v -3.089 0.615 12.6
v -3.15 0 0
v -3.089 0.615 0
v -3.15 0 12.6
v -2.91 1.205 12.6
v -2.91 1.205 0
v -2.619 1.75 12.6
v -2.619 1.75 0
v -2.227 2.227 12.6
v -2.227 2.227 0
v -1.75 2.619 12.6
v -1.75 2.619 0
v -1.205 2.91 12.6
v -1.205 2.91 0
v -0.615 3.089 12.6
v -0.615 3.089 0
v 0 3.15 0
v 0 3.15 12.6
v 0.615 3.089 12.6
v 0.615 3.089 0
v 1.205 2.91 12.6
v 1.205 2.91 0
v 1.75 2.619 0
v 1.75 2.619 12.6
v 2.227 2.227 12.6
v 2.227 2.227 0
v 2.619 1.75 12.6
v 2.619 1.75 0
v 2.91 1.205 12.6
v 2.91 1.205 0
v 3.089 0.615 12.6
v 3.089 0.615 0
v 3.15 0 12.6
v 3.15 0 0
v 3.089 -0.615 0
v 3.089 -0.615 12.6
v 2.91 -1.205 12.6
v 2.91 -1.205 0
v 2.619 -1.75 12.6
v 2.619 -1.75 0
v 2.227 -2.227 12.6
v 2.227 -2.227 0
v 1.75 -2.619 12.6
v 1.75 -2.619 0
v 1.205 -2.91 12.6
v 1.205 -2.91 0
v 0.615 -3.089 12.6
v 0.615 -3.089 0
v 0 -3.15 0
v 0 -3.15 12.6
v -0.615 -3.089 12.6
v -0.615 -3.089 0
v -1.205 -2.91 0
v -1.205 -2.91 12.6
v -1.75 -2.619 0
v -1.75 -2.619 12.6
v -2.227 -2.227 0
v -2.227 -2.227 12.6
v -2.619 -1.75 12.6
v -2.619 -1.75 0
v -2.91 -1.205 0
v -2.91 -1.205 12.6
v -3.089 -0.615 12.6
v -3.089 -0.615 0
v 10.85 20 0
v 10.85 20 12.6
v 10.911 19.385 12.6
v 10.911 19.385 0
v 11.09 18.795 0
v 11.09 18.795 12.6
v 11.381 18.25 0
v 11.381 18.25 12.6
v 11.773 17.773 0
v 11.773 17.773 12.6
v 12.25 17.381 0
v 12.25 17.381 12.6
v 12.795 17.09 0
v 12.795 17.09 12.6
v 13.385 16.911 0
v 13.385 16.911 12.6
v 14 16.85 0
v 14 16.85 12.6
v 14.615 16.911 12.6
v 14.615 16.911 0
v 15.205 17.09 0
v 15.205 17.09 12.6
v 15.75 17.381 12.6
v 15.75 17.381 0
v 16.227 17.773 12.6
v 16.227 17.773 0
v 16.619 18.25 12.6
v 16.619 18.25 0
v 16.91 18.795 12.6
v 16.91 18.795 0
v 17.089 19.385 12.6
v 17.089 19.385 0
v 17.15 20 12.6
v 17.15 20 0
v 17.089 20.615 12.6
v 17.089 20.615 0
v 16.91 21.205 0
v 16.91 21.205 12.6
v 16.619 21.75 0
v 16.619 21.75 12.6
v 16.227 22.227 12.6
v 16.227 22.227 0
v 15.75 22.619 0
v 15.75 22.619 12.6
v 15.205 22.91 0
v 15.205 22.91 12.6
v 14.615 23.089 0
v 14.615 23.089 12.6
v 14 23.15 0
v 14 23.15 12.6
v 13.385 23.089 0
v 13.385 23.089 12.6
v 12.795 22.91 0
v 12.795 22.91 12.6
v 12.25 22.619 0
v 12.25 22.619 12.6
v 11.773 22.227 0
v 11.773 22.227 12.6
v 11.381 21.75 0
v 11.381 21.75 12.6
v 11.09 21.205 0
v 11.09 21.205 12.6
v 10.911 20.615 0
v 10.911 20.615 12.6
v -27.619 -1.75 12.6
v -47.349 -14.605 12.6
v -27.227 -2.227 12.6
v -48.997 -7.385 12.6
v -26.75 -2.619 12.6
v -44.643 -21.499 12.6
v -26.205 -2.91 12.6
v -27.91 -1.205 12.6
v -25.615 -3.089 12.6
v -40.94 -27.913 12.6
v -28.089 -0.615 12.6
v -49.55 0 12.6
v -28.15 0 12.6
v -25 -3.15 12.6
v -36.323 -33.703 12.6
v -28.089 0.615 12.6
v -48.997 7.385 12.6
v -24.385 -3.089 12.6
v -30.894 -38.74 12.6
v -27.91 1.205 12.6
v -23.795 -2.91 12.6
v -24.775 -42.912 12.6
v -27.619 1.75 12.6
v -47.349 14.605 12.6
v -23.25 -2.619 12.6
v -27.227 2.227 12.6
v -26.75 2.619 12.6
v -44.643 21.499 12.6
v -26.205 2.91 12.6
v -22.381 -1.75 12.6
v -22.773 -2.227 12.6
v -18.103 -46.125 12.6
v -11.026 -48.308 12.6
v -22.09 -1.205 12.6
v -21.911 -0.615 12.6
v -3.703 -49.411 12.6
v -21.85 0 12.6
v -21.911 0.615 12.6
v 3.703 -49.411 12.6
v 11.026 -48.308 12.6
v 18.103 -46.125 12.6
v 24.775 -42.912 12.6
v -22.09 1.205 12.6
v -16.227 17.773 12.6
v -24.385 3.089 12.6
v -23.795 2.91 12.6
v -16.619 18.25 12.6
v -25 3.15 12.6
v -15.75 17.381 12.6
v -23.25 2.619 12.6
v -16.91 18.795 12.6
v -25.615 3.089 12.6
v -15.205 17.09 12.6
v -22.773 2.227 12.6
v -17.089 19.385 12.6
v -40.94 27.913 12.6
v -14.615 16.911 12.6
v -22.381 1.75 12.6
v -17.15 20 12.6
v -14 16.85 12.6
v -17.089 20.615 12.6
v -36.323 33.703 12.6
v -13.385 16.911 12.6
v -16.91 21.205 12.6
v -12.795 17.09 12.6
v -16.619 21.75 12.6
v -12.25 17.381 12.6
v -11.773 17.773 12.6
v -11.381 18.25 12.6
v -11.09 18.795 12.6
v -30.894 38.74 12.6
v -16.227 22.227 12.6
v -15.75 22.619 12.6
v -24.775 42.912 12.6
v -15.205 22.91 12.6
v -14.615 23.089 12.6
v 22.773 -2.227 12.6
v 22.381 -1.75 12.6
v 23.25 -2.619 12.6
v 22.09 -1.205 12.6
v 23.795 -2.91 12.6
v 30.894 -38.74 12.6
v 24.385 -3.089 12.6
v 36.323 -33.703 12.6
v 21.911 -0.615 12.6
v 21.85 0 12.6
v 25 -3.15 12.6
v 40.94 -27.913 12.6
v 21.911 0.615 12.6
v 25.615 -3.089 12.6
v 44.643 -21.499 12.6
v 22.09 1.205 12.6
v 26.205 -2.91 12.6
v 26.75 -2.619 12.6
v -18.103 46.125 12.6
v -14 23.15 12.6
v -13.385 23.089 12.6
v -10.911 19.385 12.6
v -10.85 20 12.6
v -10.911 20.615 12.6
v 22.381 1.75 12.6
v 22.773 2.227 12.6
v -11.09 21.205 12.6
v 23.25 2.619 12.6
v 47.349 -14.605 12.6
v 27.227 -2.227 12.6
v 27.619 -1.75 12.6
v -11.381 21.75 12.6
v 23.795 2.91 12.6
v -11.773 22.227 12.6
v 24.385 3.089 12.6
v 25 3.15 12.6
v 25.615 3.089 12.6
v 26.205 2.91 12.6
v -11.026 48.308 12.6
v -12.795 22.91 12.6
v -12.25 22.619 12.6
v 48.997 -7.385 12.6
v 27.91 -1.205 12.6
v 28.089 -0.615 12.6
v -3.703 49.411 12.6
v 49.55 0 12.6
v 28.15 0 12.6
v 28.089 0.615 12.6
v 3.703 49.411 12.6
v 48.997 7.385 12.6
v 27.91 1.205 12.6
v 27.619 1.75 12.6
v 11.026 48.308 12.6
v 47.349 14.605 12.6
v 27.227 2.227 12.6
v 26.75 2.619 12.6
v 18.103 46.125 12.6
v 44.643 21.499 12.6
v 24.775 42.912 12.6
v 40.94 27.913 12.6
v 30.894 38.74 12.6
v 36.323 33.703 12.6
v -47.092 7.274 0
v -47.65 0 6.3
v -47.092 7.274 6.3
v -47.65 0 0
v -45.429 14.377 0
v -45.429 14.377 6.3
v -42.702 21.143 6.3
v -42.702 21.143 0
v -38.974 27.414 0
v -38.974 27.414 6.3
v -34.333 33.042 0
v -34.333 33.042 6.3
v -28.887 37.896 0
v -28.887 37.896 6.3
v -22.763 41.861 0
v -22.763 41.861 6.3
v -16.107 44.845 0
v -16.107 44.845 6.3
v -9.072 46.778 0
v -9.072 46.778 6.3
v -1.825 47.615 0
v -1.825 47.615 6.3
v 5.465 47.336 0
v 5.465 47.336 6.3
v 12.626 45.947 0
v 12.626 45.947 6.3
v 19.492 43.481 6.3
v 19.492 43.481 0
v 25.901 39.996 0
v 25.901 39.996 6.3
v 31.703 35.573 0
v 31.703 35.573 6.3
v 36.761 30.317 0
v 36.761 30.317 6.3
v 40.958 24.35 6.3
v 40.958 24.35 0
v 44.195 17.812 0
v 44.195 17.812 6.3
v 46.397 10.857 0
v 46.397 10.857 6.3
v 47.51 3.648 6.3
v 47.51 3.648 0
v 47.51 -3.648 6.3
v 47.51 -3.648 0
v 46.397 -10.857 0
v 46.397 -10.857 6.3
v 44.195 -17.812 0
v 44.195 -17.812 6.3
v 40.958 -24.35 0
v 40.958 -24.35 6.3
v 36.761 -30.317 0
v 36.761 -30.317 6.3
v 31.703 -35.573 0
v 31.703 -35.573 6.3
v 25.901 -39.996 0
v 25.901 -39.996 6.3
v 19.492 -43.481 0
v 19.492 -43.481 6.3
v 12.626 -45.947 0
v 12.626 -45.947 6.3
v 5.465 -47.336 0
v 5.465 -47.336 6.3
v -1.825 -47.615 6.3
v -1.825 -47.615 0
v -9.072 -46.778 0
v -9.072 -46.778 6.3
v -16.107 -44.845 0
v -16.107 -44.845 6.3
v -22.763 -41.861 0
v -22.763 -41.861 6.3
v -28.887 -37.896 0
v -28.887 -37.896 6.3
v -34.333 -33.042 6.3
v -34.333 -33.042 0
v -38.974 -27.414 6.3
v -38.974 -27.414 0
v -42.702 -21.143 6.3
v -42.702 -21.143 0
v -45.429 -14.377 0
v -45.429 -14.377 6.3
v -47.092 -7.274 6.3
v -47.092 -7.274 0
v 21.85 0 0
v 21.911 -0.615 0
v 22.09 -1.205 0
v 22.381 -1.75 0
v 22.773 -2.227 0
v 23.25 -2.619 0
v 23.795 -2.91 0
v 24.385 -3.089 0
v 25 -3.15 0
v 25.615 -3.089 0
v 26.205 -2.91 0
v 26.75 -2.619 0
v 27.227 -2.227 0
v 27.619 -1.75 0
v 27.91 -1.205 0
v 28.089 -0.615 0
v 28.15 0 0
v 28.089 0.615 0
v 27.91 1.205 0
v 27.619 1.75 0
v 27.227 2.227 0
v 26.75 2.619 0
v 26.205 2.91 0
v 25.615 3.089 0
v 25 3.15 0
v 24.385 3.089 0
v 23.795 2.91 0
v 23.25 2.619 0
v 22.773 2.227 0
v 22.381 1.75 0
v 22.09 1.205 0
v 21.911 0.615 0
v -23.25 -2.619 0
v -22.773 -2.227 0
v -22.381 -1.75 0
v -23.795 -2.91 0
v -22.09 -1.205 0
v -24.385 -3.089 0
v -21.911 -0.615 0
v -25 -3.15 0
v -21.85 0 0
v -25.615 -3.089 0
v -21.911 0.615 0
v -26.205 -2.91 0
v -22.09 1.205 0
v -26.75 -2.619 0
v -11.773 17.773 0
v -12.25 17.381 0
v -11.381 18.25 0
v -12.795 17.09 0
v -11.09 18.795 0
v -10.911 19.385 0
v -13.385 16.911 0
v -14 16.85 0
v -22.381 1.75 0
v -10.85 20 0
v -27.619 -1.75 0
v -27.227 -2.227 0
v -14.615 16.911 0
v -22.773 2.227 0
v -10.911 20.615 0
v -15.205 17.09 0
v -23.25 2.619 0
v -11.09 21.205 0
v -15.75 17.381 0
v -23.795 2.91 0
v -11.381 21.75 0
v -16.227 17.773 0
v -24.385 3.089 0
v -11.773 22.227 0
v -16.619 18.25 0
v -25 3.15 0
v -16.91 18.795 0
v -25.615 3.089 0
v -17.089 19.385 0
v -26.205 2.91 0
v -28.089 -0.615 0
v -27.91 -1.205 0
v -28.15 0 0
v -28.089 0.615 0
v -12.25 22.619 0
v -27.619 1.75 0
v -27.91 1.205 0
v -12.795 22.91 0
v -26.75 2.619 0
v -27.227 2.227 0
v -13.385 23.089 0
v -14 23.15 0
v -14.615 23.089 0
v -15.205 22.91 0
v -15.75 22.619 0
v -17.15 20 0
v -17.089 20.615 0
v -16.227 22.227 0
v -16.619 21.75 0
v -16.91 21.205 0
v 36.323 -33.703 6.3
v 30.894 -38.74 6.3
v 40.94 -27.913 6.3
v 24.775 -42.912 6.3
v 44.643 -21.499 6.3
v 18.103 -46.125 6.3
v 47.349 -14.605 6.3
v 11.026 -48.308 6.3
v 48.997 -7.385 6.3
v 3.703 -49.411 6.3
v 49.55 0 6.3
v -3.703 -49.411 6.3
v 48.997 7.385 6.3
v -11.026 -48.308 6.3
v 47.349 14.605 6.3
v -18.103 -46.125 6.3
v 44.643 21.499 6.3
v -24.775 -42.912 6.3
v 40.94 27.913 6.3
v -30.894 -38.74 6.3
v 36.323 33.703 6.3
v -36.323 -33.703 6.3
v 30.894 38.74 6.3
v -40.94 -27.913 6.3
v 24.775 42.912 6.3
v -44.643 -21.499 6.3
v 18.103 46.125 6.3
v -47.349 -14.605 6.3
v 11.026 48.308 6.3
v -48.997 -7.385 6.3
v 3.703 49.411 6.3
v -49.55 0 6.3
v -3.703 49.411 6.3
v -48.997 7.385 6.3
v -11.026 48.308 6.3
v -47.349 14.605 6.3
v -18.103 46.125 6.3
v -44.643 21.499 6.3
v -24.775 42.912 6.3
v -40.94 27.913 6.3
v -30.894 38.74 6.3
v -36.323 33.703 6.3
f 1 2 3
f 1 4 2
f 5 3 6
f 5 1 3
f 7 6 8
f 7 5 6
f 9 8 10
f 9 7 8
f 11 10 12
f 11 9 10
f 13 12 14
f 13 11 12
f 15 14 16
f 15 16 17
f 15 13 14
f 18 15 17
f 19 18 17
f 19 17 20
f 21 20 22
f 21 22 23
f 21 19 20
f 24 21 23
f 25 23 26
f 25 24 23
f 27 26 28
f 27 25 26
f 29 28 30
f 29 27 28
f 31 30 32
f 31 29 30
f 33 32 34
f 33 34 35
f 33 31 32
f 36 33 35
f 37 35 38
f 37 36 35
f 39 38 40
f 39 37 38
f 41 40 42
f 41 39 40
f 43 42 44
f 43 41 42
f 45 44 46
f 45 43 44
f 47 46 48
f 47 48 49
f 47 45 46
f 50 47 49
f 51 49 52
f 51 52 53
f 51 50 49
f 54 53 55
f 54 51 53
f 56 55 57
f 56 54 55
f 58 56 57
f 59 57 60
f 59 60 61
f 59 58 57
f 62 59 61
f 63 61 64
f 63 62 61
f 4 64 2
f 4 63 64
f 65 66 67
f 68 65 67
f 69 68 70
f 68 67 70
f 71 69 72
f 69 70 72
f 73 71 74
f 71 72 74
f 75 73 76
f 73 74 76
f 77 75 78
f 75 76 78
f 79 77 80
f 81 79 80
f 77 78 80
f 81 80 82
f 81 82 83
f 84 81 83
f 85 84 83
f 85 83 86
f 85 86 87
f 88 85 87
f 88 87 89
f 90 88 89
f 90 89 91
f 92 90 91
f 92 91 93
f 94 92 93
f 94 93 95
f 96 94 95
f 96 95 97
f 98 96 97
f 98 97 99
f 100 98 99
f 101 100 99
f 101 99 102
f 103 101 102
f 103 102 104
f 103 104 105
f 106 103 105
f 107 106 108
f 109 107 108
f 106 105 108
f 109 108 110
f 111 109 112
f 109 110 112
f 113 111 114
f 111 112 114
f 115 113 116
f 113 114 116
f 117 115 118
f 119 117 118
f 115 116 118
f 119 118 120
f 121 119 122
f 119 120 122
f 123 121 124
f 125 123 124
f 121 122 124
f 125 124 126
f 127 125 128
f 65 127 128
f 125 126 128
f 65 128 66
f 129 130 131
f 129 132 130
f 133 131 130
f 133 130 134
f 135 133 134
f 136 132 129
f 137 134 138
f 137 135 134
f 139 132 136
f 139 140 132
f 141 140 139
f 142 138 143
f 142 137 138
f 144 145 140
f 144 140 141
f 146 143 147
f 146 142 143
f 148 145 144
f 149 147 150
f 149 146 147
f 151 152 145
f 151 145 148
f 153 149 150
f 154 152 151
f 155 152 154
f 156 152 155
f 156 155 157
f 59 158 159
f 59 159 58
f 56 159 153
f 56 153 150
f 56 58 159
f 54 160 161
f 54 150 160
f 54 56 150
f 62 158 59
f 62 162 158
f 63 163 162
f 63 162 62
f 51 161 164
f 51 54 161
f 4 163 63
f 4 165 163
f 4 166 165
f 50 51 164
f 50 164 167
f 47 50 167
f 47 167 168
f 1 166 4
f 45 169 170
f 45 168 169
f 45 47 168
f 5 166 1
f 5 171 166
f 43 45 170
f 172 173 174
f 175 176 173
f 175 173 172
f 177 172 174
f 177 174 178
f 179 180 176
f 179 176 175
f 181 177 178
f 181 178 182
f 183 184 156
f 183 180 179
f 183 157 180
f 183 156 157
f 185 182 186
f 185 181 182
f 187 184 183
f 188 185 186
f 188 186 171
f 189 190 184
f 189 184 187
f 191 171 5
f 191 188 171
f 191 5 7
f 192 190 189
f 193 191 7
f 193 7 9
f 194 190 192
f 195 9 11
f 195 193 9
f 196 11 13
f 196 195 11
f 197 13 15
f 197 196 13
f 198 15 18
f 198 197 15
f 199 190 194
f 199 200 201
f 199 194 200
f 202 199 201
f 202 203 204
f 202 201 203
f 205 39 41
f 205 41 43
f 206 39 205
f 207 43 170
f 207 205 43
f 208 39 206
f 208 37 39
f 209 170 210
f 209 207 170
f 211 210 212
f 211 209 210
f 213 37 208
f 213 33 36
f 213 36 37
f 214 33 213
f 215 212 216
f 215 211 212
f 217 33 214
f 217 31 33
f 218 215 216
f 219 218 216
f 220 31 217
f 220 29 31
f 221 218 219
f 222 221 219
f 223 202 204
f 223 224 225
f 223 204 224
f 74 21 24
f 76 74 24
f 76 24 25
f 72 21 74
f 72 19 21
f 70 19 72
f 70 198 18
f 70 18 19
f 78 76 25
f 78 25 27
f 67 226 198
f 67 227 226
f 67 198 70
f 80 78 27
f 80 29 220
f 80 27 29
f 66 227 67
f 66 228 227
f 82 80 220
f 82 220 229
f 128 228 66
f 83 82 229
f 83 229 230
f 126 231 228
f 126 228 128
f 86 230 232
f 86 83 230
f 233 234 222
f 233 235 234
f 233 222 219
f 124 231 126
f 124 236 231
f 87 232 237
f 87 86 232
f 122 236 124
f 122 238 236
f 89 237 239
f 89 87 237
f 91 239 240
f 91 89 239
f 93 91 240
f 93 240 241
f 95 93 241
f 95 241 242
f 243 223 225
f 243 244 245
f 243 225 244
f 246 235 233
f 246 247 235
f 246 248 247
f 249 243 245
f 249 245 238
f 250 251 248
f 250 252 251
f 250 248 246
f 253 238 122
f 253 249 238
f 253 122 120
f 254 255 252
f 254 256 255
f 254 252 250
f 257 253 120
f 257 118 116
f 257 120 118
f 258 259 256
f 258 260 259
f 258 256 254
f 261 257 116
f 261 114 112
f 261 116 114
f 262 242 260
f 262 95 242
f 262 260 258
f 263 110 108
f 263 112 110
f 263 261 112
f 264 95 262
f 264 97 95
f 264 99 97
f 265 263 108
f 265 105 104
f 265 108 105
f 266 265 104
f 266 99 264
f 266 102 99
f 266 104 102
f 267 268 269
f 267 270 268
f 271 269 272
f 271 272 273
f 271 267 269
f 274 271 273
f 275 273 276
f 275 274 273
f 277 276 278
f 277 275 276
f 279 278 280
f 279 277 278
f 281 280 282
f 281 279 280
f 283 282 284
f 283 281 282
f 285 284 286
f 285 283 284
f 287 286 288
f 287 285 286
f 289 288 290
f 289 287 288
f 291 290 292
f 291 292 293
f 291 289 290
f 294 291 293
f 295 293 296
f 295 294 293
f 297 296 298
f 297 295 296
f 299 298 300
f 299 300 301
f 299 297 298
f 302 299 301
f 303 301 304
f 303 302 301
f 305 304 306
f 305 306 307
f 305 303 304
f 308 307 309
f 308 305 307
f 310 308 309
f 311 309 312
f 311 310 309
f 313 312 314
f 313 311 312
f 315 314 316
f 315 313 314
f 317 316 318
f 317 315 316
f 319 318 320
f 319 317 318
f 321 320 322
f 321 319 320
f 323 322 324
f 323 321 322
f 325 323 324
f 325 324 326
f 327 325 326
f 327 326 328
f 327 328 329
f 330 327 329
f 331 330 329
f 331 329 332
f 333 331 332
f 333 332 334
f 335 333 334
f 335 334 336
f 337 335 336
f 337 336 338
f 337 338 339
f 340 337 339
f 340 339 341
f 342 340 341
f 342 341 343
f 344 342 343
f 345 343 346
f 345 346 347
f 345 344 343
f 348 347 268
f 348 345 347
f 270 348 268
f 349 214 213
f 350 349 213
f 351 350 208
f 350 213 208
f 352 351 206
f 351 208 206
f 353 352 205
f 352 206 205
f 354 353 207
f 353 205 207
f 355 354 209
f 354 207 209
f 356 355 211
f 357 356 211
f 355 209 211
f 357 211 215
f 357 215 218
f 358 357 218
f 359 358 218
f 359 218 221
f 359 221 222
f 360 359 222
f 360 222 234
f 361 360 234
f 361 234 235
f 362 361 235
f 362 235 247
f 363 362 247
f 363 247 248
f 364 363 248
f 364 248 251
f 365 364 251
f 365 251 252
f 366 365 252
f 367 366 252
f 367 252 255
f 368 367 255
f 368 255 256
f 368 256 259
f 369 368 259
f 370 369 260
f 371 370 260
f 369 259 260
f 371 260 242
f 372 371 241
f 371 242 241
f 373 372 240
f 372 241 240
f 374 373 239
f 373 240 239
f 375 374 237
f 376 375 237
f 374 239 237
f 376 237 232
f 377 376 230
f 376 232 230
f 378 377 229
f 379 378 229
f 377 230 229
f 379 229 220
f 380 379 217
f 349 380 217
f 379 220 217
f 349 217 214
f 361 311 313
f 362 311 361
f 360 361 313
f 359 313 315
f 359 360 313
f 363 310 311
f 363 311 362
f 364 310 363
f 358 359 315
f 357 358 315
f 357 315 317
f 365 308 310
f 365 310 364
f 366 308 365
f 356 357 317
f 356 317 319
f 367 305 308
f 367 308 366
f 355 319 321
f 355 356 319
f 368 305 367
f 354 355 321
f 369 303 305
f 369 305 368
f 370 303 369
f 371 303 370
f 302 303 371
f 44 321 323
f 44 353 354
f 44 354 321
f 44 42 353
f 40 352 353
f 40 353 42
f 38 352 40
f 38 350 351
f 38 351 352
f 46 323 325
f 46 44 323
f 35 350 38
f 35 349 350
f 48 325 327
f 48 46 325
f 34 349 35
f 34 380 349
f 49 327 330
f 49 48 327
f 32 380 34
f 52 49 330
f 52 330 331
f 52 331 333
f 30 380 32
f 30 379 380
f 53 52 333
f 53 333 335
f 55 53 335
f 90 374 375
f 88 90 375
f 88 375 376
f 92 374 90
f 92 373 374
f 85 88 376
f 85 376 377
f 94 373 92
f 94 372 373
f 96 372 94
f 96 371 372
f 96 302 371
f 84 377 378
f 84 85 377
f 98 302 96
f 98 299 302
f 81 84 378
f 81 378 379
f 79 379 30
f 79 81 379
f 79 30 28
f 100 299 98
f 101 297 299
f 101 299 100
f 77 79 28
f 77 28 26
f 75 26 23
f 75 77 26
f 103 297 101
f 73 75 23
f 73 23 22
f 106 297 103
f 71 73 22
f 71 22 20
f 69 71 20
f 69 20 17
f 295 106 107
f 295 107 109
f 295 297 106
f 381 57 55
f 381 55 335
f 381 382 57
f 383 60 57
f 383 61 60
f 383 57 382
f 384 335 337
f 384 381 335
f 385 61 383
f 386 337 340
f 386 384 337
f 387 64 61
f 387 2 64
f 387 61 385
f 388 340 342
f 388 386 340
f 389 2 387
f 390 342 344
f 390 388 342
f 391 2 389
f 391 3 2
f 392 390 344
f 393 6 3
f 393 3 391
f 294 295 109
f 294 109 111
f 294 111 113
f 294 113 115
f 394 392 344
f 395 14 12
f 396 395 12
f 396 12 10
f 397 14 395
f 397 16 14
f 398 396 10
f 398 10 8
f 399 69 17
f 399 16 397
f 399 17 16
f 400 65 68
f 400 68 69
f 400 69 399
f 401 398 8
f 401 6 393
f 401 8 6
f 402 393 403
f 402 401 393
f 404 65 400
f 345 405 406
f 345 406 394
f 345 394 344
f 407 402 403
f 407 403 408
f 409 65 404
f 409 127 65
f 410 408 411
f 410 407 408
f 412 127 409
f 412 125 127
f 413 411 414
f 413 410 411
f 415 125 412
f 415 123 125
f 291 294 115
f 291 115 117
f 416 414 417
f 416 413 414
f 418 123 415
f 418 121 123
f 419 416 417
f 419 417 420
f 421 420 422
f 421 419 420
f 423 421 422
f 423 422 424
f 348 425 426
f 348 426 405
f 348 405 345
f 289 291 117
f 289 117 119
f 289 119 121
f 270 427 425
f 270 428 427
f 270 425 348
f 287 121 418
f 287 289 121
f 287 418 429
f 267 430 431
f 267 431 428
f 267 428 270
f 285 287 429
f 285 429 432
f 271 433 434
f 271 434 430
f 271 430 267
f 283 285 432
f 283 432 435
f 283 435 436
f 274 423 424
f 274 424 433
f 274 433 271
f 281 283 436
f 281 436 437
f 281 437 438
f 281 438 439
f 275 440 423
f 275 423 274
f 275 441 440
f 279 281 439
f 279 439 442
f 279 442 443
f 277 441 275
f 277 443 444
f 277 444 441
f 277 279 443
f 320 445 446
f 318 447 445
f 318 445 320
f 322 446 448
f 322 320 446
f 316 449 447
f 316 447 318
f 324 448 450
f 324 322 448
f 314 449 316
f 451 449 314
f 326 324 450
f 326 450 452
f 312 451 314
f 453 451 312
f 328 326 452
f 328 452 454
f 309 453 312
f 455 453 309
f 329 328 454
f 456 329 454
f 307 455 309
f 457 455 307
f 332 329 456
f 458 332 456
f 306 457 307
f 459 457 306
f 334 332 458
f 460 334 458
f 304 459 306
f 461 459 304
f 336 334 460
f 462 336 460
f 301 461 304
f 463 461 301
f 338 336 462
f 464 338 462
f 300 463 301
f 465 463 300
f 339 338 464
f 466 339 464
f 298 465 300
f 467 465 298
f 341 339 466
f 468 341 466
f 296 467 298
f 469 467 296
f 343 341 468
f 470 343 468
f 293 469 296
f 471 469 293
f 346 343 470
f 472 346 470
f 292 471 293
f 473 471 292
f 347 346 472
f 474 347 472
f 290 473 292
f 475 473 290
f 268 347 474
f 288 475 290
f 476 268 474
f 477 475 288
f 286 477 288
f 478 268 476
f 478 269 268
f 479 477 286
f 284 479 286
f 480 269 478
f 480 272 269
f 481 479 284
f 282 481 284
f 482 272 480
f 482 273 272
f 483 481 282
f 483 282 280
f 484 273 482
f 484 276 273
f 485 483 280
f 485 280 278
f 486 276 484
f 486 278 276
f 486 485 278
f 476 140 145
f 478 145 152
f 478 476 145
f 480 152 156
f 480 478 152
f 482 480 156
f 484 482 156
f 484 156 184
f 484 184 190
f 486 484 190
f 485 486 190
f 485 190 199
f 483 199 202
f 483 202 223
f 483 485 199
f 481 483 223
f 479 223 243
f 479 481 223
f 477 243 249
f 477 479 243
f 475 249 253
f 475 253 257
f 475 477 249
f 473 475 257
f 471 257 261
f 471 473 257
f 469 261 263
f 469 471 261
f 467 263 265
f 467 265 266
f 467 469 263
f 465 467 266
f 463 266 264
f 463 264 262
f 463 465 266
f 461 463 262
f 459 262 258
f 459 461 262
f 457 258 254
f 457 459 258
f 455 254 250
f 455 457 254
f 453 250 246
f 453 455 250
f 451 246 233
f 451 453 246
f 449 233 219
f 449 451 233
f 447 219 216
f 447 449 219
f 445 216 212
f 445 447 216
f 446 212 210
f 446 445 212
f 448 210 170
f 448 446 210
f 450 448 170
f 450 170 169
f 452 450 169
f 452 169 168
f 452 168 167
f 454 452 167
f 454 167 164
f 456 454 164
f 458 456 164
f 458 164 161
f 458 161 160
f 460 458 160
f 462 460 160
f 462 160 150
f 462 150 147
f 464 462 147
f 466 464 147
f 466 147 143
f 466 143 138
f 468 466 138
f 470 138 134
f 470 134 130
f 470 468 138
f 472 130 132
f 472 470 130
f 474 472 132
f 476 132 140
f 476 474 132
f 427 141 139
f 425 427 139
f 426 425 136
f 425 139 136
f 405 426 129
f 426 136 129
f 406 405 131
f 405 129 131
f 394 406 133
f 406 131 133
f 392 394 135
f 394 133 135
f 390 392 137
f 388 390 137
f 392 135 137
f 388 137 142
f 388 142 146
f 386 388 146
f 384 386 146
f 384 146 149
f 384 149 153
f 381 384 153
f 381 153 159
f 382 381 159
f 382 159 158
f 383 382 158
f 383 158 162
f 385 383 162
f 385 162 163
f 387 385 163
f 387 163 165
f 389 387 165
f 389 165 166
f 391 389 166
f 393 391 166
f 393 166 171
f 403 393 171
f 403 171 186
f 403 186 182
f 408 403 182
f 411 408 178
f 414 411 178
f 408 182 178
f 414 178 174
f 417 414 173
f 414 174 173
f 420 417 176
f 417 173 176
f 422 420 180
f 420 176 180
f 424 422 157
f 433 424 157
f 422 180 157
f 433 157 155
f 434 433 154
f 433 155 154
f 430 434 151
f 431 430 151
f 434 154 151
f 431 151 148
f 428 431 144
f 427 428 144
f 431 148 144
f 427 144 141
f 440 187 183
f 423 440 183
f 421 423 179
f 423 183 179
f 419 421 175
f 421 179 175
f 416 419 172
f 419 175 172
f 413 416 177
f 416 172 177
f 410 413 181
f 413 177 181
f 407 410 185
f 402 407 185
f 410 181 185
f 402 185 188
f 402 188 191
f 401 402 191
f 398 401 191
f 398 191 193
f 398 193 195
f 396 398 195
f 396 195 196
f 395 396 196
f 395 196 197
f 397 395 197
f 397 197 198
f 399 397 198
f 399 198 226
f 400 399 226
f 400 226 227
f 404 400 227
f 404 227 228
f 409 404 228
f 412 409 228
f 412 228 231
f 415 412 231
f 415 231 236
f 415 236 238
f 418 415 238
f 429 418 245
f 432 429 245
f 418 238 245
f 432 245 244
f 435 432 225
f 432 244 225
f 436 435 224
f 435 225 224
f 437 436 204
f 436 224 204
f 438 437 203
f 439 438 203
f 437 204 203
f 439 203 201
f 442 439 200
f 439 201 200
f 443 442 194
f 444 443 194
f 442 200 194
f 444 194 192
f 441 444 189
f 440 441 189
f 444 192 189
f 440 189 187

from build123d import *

# Parameters (mm, degrees)
F3_D = 6.3
F5_D = 6.3


with BuildPart() as f1:
    # F0 (on Front) → F1 (revolve)
    with BuildSketch(Plane.XZ):
        Polygon((-47.65, 6.3), (-47.65, 0), (-3.15, 0), (-3.15, 12.6), (-49.55, 12.6), (-49.55, 6.3), align=None)
    revolve(axis=Axis((0, 0, -5.1516543608), (0, 0, -1)))

    # F3 (through all)
    with Locations(Plane(origin=(0, 0, 0), x_dir=(1, 0, 0), z_dir=(0, 0, -1))):
        with Locations((25, 0), (-25, 0)):
            Hole(F3_D / 2)

    # F5 (through all)
    with Locations(Plane(origin=(0, 0, 0), x_dir=(1, 0, 0), z_dir=(0, 0, -1))):
        with Locations((-14, -20), (14, -20)):
            Hole(F5_D / 2)


solid = f1.part
